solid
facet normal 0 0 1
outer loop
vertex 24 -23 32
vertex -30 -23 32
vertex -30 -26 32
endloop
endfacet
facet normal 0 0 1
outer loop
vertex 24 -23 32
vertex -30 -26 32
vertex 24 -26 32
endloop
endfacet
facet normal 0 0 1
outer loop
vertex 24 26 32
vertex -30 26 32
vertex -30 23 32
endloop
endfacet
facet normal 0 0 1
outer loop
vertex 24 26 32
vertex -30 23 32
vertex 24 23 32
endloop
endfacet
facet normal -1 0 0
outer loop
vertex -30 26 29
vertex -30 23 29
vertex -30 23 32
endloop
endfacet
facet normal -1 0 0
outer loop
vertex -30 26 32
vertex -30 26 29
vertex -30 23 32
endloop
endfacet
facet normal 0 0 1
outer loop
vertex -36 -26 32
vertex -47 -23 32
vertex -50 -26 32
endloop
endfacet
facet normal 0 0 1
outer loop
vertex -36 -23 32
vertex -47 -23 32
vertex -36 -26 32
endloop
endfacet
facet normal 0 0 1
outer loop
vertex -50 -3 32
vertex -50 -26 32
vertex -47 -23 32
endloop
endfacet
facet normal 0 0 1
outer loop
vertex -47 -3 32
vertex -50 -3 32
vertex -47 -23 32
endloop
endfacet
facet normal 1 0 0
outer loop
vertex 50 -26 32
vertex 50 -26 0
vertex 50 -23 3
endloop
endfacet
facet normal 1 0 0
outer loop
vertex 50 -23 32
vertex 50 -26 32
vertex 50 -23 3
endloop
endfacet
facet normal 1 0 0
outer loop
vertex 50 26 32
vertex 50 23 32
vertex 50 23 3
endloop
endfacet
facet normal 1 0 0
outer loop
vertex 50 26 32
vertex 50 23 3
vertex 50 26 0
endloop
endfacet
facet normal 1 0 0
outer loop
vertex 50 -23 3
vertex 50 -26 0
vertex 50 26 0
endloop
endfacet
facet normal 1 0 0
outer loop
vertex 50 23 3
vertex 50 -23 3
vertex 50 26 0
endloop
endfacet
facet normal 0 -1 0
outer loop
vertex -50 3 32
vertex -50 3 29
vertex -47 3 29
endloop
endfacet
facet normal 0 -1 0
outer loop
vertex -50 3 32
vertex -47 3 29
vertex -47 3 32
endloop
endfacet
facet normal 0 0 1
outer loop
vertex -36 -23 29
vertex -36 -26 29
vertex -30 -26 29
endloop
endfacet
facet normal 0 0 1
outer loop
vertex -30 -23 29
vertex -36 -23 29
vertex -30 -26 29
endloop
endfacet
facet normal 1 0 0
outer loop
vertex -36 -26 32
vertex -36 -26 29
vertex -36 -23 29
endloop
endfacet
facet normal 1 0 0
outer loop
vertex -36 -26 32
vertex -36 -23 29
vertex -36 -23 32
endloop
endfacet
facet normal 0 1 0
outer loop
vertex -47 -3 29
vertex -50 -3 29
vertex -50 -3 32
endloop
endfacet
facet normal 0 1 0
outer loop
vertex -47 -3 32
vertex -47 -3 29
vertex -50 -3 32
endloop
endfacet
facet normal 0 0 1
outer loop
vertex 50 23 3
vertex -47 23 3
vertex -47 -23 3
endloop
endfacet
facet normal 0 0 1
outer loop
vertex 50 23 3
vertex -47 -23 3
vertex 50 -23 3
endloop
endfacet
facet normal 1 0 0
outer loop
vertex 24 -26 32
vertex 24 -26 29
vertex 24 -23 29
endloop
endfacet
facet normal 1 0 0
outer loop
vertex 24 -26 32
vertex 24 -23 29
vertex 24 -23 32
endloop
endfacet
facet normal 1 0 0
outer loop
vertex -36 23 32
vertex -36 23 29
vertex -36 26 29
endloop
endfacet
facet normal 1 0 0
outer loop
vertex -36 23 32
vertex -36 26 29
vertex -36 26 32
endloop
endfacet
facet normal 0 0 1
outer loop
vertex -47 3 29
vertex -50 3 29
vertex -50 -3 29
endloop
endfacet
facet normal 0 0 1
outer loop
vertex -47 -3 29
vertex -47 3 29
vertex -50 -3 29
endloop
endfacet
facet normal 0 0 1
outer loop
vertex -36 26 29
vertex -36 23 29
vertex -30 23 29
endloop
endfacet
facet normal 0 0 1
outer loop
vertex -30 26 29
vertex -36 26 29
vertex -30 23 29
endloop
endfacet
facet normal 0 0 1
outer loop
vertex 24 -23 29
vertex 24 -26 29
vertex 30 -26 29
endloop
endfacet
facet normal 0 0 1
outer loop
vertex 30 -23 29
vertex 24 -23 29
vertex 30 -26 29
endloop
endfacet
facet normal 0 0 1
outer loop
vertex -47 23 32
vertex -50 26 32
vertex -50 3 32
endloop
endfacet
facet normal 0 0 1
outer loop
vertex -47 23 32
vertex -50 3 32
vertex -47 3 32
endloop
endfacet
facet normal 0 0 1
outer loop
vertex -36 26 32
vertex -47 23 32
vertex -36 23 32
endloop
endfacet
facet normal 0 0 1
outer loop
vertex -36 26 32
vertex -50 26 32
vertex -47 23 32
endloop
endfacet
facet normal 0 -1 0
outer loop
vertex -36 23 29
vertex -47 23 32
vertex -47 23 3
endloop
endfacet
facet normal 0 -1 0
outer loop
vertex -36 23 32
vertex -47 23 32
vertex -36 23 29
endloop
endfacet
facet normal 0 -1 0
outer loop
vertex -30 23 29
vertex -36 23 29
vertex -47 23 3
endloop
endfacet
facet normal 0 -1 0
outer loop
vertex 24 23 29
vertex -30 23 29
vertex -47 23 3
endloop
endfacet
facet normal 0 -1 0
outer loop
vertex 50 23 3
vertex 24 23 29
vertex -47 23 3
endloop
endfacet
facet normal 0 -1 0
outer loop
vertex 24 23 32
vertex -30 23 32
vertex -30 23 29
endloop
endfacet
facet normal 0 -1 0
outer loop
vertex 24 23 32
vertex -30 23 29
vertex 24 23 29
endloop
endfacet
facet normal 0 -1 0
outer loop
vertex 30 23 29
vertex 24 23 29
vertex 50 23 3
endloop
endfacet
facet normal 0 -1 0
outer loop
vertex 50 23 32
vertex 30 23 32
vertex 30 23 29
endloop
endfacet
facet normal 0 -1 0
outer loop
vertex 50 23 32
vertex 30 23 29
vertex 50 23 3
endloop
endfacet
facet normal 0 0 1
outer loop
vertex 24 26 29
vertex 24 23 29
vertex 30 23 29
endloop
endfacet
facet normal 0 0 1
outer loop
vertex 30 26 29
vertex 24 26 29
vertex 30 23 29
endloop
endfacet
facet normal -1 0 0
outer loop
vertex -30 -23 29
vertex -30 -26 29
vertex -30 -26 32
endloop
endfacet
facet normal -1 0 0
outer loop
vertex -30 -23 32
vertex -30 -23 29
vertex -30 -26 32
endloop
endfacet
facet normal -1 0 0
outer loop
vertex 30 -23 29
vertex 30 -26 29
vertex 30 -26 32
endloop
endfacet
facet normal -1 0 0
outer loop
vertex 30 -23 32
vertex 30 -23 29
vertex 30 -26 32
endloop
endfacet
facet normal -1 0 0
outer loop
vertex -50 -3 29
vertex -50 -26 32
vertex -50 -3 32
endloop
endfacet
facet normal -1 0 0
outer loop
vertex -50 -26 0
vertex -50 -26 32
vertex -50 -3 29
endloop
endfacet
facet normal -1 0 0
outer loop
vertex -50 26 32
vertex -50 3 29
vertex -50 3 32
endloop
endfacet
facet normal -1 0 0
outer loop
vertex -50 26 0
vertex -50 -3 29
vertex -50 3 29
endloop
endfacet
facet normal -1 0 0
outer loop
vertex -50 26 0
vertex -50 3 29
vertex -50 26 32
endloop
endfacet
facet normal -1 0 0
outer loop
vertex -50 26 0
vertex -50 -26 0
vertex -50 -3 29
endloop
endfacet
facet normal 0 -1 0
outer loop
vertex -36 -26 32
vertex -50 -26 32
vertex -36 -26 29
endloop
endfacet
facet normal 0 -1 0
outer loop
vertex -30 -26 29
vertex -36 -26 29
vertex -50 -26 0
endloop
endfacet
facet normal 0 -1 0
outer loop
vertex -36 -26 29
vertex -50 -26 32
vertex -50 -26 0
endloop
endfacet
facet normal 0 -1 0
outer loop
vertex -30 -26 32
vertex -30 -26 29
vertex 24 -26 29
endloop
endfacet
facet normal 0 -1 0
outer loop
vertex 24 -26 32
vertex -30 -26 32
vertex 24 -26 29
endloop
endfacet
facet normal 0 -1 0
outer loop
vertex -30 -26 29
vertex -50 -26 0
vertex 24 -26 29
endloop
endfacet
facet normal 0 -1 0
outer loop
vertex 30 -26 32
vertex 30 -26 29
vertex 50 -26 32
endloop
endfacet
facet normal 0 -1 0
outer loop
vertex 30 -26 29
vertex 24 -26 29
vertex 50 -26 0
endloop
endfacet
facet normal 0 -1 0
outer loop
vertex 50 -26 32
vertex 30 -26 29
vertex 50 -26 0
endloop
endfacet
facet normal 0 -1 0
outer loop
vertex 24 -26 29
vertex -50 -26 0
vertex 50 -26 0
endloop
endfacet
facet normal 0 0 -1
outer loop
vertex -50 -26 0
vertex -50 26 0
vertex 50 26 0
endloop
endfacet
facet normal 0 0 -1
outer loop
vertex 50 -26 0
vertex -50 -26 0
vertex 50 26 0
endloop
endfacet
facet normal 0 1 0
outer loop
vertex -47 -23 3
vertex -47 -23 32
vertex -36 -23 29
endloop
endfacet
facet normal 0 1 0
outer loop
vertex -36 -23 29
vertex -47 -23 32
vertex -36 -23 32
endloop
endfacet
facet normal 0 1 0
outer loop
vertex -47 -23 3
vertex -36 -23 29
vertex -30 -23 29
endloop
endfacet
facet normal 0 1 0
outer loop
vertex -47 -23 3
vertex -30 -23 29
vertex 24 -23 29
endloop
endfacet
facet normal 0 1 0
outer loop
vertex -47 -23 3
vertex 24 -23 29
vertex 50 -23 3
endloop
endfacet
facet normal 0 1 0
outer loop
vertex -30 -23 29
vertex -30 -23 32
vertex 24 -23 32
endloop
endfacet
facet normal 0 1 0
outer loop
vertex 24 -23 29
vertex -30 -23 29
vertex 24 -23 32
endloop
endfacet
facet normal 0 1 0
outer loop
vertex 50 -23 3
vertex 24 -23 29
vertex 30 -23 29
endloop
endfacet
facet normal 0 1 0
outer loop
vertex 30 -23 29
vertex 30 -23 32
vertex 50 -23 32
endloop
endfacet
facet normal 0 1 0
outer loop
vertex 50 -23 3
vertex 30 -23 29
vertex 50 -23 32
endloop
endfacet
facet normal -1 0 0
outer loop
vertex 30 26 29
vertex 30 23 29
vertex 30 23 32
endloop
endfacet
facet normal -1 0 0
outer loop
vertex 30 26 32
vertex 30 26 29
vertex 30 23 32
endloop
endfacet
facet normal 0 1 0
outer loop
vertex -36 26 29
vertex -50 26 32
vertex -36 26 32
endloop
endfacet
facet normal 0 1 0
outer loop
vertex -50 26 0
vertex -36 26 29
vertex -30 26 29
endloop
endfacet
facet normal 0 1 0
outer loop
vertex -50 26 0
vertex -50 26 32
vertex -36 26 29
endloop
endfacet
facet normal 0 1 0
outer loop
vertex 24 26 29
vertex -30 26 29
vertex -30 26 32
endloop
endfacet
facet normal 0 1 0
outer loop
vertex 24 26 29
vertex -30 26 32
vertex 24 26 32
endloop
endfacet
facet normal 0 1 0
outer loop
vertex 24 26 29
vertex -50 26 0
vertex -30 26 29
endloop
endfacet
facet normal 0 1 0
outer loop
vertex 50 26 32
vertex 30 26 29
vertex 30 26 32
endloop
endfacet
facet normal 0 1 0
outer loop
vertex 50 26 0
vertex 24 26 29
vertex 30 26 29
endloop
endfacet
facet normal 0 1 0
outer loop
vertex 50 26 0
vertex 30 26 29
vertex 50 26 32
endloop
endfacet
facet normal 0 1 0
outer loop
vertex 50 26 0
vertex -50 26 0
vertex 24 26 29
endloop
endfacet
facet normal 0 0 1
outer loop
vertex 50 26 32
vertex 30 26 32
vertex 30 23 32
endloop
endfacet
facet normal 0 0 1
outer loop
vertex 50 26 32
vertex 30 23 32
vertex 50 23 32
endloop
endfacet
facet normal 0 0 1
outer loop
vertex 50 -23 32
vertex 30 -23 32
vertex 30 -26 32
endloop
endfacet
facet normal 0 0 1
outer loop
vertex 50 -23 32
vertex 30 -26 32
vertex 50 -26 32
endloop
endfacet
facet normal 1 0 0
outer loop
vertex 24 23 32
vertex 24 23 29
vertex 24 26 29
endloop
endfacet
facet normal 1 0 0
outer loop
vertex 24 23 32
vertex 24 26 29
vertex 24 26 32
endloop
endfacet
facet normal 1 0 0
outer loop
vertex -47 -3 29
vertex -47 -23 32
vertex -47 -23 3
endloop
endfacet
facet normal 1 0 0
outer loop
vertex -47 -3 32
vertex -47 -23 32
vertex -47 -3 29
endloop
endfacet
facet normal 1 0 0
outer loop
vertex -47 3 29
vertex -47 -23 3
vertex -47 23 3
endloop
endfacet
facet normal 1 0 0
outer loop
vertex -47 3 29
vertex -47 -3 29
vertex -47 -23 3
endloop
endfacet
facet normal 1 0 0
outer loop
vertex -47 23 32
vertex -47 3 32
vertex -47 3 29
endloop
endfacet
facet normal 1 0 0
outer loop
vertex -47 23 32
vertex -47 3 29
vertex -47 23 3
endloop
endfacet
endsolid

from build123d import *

# Parameters (mm, degrees)
F0_W     = 100
F0_H     = 52
F1_DEPTH = 32
F2_W     = 97
F2_H     = 46
F3_DEPTH = 29
F4_W     = 6
F4_H     = 3
F5_DEPTH = 52.001
F6_W     = 6
F6_H     = 3
F7_DEPTH = 52.001
F8_W     = 6
F8_H     = 3
F9_DEPTH = 100.001


with BuildPart() as f1:
    # F0 (on Top) → F1 (new body)
    with BuildSketch(Plane.XY):
        Rectangle(F0_W, F0_H)
    extrude(amount=F1_DEPTH)

    # F2 (on face) → F3 (cut)
    with BuildSketch(Plane.XY.offset(32)):
        with Locations((1.5, 0)):
            Rectangle(F2_W, F2_H)
    extrude(amount=-F3_DEPTH, mode=Mode.SUBTRACT)

    # F4 (on face) → F5 (cut, through all)
    with BuildSketch(Plane.XZ.offset(26)):
        with Locations((-33, 30.5)):
            Rectangle(F4_W, F4_H)
    extrude(amount=-F5_DEPTH, mode=Mode.SUBTRACT)

    # F6 (on face) → F7 (cut, through all)
    with BuildSketch(Plane.XZ.offset(26)):
        with Locations((27, 30.5)):
            Rectangle(F6_W, F6_H)
    extrude(amount=-F7_DEPTH, mode=Mode.SUBTRACT)

    # F8 (on face) → F9 (cut, through all)
    with BuildSketch(Plane(origin=(-50, 0, 0), x_dir=(0, -1, 0), z_dir=(-1, 0, 0))):
        with Locations((0, 30.5)):
            Rectangle(F8_W, F8_H)
    extrude(amount=-F9_DEPTH, mode=Mode.SUBTRACT)


solid = f1.part
